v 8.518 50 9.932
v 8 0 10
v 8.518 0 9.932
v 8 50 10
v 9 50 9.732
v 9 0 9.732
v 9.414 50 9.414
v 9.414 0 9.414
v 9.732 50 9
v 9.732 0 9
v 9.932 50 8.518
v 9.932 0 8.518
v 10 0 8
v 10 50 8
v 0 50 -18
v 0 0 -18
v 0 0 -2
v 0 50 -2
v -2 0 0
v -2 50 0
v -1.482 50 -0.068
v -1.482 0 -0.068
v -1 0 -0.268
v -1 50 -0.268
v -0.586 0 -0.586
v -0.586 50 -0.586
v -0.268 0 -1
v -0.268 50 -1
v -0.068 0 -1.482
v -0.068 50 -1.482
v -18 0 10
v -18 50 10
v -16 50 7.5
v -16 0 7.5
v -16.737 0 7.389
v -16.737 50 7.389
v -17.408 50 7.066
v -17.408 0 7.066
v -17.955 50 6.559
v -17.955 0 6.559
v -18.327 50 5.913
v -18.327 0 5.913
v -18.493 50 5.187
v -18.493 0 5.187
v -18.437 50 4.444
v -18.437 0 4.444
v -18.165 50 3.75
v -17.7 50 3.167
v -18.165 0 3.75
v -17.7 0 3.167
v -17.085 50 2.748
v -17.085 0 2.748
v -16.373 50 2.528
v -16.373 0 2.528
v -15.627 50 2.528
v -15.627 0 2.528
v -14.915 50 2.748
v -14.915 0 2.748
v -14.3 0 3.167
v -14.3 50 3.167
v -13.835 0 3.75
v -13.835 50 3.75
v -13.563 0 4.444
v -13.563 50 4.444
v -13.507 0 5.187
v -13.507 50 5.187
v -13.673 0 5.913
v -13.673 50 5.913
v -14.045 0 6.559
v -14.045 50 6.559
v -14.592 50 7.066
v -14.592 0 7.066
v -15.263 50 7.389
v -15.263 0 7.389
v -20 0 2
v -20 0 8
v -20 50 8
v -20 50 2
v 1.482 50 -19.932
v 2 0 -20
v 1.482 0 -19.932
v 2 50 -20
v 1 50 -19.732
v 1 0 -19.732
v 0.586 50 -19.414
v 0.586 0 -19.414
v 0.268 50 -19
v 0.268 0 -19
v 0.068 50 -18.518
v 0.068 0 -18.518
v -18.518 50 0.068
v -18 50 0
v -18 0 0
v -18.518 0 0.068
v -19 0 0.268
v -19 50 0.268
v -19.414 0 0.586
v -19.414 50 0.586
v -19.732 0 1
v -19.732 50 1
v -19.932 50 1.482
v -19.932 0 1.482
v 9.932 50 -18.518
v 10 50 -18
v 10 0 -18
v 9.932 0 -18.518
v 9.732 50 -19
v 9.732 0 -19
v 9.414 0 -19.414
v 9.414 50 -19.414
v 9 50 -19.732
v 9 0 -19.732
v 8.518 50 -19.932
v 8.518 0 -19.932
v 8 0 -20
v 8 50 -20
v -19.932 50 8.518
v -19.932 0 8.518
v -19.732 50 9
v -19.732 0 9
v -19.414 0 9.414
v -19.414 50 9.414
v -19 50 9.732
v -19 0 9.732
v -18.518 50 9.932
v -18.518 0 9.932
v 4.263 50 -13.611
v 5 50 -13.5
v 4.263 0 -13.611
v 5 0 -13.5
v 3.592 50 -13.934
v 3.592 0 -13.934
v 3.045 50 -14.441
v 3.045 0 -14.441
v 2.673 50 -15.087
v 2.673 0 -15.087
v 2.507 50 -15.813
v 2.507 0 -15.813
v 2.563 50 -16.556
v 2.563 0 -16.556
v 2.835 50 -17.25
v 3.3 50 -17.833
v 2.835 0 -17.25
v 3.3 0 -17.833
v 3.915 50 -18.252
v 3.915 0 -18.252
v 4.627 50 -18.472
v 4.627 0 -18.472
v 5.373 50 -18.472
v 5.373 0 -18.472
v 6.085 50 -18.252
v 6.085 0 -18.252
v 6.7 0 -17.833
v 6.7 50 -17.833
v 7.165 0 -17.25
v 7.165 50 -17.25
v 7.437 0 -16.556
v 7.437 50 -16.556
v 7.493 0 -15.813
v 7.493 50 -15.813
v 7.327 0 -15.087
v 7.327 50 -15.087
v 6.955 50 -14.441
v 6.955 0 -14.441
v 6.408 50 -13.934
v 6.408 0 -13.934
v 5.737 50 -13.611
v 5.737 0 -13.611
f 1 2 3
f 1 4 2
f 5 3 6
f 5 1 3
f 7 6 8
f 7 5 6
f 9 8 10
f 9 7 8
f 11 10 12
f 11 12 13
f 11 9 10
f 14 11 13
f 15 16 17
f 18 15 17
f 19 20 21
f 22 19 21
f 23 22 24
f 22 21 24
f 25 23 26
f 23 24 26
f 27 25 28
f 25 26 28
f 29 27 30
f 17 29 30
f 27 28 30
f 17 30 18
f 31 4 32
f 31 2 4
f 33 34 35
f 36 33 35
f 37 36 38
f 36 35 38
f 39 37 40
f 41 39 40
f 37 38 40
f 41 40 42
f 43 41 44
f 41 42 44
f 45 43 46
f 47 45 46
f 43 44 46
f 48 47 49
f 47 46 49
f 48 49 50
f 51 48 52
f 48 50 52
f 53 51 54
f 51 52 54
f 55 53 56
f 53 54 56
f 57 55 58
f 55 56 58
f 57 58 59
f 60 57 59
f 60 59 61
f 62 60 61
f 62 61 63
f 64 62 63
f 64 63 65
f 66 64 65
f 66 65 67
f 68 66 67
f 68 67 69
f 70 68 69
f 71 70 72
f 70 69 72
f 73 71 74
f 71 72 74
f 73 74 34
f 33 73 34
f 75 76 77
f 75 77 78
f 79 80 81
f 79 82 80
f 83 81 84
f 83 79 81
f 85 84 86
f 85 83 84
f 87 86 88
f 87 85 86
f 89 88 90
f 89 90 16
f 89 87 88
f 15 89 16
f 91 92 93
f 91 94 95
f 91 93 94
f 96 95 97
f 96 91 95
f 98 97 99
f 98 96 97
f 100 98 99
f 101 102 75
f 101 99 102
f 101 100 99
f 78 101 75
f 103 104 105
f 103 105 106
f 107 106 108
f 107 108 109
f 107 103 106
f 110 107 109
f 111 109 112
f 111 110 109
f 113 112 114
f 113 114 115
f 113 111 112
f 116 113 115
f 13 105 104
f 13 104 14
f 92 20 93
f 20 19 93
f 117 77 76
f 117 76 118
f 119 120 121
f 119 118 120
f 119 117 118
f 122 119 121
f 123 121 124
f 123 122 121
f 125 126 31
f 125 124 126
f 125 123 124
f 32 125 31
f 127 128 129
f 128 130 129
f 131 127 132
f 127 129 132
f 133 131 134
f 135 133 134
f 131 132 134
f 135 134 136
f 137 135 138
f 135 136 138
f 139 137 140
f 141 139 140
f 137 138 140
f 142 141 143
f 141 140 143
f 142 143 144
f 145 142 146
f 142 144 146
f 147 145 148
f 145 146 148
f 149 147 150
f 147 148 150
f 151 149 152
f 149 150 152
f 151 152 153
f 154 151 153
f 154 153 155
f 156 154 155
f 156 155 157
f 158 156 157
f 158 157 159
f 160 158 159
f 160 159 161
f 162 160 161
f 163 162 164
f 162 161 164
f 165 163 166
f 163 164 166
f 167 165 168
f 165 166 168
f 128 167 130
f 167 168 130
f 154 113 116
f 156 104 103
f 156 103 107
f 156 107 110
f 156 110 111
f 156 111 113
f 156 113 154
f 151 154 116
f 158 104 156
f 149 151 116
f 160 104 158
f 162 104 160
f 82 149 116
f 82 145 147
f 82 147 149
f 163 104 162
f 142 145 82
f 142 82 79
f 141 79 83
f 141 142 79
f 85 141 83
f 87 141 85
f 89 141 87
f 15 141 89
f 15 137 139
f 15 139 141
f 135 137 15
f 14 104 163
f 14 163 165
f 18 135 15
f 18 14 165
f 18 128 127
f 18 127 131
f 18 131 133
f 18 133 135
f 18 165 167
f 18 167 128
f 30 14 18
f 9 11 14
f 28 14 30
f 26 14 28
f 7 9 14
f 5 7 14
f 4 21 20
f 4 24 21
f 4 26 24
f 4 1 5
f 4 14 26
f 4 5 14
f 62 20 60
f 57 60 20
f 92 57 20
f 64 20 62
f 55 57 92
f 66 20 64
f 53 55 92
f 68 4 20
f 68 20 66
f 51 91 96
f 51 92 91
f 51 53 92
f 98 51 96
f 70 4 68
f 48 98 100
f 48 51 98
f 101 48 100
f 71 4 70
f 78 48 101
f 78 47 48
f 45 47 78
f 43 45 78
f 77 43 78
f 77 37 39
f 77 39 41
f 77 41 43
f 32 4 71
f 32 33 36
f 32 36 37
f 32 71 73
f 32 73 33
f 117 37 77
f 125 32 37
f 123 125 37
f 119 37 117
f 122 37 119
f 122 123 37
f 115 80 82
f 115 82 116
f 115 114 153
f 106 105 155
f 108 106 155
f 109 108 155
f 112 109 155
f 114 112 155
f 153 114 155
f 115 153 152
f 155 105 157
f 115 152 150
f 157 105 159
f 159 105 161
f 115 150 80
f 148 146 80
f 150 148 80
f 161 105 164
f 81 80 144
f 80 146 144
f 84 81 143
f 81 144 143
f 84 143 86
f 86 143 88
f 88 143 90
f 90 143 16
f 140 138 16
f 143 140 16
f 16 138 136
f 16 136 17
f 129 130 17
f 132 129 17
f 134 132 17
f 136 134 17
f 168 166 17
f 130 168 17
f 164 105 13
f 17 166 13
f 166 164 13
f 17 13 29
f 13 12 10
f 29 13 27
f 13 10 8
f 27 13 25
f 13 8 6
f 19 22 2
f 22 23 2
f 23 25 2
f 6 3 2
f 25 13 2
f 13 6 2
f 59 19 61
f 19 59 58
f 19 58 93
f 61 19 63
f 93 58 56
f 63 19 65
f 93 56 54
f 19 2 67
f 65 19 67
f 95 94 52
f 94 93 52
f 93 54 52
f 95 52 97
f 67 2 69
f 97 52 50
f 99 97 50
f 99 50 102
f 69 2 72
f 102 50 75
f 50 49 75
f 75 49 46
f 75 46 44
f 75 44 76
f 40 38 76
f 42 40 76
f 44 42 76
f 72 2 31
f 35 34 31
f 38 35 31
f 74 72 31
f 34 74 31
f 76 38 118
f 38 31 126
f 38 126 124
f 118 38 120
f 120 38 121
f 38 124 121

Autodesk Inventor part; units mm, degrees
ref_plane "YZ Plane" through (0, 0, 0) normal (1, 0, 0) x (0, 1, 0)
ref_plane "XZ Plane" through (0, 0, 0) normal (0, 1, 0) x (-1, 0, 0)
ref_plane "XY Plane" through (0, 0, 0) normal (0, 0, 1) x (1, 0, 0)
sketch "Sketch2" plane through (0, 0, 0) normal (0, 1, 0) x (-1, 0, 0)
  line L0 (-10, 10) -> (20, 10)
  line L1 (20, 10) -> (20, 0)
  line L2 (0, -20) -> (-10, -20)
  line L3 (-10, -20) -> (-10, 10)
  line L4 (0, 0) -> (20, 0)
  line L5 (20, 0) -> (20, -20)
  line L6 (20, -20) -> (0, -20)
  line L7 (0, -20) -> (0, 0)
  point P0 (5, 0)
  point P1 (0, -5)
  dimension "d4" = 30
  dimension "d5" = 30
  dimension "d6" = 20
  dimension "d7" = 20
extrude "Extrusion2" add sketch "Sketch2" along normal blind 50 contours L0 L1 L4 L7 L2 L3
sketch "Sketch3" plane through (0, 50, 0) normal (0, 1, 0) x (1, 0, 0)
  line L0 (10, 20) -> (0, 20) projected
  line L1 (0, 20) -> (0, 0) projected
  line L2 (-20, 0) -> (-20, -10) projected
  line L3 (-20, -10) -> (10, -10) projected
  point P0 (-16, -5)
  point P1 (5, 16)
  point P2 (-20, -5)
  point P3 (10, -10)
  point P4 (0, 5)
  dimension "d17" = 4
  dimension "d18" = 5
  dimension "d19" = 4
  dimension "d20" = 5
hole "Hole1" at (-16, 50, 5) at (5, 50, -16) direction (0, -1, 0) diameter 5 end through all
fillet "Fillet1" radius 2 2 edges at (10, 25, 10) (0, 25, 0)
fillet "Fillet2" radius 2 4 edges at (10, 25, -20) (0, 25, -20) (-20, 25, 0) (-20, 25, 10)
properties part number "Base_3D Printed Beam" material "ABS Plastic"
